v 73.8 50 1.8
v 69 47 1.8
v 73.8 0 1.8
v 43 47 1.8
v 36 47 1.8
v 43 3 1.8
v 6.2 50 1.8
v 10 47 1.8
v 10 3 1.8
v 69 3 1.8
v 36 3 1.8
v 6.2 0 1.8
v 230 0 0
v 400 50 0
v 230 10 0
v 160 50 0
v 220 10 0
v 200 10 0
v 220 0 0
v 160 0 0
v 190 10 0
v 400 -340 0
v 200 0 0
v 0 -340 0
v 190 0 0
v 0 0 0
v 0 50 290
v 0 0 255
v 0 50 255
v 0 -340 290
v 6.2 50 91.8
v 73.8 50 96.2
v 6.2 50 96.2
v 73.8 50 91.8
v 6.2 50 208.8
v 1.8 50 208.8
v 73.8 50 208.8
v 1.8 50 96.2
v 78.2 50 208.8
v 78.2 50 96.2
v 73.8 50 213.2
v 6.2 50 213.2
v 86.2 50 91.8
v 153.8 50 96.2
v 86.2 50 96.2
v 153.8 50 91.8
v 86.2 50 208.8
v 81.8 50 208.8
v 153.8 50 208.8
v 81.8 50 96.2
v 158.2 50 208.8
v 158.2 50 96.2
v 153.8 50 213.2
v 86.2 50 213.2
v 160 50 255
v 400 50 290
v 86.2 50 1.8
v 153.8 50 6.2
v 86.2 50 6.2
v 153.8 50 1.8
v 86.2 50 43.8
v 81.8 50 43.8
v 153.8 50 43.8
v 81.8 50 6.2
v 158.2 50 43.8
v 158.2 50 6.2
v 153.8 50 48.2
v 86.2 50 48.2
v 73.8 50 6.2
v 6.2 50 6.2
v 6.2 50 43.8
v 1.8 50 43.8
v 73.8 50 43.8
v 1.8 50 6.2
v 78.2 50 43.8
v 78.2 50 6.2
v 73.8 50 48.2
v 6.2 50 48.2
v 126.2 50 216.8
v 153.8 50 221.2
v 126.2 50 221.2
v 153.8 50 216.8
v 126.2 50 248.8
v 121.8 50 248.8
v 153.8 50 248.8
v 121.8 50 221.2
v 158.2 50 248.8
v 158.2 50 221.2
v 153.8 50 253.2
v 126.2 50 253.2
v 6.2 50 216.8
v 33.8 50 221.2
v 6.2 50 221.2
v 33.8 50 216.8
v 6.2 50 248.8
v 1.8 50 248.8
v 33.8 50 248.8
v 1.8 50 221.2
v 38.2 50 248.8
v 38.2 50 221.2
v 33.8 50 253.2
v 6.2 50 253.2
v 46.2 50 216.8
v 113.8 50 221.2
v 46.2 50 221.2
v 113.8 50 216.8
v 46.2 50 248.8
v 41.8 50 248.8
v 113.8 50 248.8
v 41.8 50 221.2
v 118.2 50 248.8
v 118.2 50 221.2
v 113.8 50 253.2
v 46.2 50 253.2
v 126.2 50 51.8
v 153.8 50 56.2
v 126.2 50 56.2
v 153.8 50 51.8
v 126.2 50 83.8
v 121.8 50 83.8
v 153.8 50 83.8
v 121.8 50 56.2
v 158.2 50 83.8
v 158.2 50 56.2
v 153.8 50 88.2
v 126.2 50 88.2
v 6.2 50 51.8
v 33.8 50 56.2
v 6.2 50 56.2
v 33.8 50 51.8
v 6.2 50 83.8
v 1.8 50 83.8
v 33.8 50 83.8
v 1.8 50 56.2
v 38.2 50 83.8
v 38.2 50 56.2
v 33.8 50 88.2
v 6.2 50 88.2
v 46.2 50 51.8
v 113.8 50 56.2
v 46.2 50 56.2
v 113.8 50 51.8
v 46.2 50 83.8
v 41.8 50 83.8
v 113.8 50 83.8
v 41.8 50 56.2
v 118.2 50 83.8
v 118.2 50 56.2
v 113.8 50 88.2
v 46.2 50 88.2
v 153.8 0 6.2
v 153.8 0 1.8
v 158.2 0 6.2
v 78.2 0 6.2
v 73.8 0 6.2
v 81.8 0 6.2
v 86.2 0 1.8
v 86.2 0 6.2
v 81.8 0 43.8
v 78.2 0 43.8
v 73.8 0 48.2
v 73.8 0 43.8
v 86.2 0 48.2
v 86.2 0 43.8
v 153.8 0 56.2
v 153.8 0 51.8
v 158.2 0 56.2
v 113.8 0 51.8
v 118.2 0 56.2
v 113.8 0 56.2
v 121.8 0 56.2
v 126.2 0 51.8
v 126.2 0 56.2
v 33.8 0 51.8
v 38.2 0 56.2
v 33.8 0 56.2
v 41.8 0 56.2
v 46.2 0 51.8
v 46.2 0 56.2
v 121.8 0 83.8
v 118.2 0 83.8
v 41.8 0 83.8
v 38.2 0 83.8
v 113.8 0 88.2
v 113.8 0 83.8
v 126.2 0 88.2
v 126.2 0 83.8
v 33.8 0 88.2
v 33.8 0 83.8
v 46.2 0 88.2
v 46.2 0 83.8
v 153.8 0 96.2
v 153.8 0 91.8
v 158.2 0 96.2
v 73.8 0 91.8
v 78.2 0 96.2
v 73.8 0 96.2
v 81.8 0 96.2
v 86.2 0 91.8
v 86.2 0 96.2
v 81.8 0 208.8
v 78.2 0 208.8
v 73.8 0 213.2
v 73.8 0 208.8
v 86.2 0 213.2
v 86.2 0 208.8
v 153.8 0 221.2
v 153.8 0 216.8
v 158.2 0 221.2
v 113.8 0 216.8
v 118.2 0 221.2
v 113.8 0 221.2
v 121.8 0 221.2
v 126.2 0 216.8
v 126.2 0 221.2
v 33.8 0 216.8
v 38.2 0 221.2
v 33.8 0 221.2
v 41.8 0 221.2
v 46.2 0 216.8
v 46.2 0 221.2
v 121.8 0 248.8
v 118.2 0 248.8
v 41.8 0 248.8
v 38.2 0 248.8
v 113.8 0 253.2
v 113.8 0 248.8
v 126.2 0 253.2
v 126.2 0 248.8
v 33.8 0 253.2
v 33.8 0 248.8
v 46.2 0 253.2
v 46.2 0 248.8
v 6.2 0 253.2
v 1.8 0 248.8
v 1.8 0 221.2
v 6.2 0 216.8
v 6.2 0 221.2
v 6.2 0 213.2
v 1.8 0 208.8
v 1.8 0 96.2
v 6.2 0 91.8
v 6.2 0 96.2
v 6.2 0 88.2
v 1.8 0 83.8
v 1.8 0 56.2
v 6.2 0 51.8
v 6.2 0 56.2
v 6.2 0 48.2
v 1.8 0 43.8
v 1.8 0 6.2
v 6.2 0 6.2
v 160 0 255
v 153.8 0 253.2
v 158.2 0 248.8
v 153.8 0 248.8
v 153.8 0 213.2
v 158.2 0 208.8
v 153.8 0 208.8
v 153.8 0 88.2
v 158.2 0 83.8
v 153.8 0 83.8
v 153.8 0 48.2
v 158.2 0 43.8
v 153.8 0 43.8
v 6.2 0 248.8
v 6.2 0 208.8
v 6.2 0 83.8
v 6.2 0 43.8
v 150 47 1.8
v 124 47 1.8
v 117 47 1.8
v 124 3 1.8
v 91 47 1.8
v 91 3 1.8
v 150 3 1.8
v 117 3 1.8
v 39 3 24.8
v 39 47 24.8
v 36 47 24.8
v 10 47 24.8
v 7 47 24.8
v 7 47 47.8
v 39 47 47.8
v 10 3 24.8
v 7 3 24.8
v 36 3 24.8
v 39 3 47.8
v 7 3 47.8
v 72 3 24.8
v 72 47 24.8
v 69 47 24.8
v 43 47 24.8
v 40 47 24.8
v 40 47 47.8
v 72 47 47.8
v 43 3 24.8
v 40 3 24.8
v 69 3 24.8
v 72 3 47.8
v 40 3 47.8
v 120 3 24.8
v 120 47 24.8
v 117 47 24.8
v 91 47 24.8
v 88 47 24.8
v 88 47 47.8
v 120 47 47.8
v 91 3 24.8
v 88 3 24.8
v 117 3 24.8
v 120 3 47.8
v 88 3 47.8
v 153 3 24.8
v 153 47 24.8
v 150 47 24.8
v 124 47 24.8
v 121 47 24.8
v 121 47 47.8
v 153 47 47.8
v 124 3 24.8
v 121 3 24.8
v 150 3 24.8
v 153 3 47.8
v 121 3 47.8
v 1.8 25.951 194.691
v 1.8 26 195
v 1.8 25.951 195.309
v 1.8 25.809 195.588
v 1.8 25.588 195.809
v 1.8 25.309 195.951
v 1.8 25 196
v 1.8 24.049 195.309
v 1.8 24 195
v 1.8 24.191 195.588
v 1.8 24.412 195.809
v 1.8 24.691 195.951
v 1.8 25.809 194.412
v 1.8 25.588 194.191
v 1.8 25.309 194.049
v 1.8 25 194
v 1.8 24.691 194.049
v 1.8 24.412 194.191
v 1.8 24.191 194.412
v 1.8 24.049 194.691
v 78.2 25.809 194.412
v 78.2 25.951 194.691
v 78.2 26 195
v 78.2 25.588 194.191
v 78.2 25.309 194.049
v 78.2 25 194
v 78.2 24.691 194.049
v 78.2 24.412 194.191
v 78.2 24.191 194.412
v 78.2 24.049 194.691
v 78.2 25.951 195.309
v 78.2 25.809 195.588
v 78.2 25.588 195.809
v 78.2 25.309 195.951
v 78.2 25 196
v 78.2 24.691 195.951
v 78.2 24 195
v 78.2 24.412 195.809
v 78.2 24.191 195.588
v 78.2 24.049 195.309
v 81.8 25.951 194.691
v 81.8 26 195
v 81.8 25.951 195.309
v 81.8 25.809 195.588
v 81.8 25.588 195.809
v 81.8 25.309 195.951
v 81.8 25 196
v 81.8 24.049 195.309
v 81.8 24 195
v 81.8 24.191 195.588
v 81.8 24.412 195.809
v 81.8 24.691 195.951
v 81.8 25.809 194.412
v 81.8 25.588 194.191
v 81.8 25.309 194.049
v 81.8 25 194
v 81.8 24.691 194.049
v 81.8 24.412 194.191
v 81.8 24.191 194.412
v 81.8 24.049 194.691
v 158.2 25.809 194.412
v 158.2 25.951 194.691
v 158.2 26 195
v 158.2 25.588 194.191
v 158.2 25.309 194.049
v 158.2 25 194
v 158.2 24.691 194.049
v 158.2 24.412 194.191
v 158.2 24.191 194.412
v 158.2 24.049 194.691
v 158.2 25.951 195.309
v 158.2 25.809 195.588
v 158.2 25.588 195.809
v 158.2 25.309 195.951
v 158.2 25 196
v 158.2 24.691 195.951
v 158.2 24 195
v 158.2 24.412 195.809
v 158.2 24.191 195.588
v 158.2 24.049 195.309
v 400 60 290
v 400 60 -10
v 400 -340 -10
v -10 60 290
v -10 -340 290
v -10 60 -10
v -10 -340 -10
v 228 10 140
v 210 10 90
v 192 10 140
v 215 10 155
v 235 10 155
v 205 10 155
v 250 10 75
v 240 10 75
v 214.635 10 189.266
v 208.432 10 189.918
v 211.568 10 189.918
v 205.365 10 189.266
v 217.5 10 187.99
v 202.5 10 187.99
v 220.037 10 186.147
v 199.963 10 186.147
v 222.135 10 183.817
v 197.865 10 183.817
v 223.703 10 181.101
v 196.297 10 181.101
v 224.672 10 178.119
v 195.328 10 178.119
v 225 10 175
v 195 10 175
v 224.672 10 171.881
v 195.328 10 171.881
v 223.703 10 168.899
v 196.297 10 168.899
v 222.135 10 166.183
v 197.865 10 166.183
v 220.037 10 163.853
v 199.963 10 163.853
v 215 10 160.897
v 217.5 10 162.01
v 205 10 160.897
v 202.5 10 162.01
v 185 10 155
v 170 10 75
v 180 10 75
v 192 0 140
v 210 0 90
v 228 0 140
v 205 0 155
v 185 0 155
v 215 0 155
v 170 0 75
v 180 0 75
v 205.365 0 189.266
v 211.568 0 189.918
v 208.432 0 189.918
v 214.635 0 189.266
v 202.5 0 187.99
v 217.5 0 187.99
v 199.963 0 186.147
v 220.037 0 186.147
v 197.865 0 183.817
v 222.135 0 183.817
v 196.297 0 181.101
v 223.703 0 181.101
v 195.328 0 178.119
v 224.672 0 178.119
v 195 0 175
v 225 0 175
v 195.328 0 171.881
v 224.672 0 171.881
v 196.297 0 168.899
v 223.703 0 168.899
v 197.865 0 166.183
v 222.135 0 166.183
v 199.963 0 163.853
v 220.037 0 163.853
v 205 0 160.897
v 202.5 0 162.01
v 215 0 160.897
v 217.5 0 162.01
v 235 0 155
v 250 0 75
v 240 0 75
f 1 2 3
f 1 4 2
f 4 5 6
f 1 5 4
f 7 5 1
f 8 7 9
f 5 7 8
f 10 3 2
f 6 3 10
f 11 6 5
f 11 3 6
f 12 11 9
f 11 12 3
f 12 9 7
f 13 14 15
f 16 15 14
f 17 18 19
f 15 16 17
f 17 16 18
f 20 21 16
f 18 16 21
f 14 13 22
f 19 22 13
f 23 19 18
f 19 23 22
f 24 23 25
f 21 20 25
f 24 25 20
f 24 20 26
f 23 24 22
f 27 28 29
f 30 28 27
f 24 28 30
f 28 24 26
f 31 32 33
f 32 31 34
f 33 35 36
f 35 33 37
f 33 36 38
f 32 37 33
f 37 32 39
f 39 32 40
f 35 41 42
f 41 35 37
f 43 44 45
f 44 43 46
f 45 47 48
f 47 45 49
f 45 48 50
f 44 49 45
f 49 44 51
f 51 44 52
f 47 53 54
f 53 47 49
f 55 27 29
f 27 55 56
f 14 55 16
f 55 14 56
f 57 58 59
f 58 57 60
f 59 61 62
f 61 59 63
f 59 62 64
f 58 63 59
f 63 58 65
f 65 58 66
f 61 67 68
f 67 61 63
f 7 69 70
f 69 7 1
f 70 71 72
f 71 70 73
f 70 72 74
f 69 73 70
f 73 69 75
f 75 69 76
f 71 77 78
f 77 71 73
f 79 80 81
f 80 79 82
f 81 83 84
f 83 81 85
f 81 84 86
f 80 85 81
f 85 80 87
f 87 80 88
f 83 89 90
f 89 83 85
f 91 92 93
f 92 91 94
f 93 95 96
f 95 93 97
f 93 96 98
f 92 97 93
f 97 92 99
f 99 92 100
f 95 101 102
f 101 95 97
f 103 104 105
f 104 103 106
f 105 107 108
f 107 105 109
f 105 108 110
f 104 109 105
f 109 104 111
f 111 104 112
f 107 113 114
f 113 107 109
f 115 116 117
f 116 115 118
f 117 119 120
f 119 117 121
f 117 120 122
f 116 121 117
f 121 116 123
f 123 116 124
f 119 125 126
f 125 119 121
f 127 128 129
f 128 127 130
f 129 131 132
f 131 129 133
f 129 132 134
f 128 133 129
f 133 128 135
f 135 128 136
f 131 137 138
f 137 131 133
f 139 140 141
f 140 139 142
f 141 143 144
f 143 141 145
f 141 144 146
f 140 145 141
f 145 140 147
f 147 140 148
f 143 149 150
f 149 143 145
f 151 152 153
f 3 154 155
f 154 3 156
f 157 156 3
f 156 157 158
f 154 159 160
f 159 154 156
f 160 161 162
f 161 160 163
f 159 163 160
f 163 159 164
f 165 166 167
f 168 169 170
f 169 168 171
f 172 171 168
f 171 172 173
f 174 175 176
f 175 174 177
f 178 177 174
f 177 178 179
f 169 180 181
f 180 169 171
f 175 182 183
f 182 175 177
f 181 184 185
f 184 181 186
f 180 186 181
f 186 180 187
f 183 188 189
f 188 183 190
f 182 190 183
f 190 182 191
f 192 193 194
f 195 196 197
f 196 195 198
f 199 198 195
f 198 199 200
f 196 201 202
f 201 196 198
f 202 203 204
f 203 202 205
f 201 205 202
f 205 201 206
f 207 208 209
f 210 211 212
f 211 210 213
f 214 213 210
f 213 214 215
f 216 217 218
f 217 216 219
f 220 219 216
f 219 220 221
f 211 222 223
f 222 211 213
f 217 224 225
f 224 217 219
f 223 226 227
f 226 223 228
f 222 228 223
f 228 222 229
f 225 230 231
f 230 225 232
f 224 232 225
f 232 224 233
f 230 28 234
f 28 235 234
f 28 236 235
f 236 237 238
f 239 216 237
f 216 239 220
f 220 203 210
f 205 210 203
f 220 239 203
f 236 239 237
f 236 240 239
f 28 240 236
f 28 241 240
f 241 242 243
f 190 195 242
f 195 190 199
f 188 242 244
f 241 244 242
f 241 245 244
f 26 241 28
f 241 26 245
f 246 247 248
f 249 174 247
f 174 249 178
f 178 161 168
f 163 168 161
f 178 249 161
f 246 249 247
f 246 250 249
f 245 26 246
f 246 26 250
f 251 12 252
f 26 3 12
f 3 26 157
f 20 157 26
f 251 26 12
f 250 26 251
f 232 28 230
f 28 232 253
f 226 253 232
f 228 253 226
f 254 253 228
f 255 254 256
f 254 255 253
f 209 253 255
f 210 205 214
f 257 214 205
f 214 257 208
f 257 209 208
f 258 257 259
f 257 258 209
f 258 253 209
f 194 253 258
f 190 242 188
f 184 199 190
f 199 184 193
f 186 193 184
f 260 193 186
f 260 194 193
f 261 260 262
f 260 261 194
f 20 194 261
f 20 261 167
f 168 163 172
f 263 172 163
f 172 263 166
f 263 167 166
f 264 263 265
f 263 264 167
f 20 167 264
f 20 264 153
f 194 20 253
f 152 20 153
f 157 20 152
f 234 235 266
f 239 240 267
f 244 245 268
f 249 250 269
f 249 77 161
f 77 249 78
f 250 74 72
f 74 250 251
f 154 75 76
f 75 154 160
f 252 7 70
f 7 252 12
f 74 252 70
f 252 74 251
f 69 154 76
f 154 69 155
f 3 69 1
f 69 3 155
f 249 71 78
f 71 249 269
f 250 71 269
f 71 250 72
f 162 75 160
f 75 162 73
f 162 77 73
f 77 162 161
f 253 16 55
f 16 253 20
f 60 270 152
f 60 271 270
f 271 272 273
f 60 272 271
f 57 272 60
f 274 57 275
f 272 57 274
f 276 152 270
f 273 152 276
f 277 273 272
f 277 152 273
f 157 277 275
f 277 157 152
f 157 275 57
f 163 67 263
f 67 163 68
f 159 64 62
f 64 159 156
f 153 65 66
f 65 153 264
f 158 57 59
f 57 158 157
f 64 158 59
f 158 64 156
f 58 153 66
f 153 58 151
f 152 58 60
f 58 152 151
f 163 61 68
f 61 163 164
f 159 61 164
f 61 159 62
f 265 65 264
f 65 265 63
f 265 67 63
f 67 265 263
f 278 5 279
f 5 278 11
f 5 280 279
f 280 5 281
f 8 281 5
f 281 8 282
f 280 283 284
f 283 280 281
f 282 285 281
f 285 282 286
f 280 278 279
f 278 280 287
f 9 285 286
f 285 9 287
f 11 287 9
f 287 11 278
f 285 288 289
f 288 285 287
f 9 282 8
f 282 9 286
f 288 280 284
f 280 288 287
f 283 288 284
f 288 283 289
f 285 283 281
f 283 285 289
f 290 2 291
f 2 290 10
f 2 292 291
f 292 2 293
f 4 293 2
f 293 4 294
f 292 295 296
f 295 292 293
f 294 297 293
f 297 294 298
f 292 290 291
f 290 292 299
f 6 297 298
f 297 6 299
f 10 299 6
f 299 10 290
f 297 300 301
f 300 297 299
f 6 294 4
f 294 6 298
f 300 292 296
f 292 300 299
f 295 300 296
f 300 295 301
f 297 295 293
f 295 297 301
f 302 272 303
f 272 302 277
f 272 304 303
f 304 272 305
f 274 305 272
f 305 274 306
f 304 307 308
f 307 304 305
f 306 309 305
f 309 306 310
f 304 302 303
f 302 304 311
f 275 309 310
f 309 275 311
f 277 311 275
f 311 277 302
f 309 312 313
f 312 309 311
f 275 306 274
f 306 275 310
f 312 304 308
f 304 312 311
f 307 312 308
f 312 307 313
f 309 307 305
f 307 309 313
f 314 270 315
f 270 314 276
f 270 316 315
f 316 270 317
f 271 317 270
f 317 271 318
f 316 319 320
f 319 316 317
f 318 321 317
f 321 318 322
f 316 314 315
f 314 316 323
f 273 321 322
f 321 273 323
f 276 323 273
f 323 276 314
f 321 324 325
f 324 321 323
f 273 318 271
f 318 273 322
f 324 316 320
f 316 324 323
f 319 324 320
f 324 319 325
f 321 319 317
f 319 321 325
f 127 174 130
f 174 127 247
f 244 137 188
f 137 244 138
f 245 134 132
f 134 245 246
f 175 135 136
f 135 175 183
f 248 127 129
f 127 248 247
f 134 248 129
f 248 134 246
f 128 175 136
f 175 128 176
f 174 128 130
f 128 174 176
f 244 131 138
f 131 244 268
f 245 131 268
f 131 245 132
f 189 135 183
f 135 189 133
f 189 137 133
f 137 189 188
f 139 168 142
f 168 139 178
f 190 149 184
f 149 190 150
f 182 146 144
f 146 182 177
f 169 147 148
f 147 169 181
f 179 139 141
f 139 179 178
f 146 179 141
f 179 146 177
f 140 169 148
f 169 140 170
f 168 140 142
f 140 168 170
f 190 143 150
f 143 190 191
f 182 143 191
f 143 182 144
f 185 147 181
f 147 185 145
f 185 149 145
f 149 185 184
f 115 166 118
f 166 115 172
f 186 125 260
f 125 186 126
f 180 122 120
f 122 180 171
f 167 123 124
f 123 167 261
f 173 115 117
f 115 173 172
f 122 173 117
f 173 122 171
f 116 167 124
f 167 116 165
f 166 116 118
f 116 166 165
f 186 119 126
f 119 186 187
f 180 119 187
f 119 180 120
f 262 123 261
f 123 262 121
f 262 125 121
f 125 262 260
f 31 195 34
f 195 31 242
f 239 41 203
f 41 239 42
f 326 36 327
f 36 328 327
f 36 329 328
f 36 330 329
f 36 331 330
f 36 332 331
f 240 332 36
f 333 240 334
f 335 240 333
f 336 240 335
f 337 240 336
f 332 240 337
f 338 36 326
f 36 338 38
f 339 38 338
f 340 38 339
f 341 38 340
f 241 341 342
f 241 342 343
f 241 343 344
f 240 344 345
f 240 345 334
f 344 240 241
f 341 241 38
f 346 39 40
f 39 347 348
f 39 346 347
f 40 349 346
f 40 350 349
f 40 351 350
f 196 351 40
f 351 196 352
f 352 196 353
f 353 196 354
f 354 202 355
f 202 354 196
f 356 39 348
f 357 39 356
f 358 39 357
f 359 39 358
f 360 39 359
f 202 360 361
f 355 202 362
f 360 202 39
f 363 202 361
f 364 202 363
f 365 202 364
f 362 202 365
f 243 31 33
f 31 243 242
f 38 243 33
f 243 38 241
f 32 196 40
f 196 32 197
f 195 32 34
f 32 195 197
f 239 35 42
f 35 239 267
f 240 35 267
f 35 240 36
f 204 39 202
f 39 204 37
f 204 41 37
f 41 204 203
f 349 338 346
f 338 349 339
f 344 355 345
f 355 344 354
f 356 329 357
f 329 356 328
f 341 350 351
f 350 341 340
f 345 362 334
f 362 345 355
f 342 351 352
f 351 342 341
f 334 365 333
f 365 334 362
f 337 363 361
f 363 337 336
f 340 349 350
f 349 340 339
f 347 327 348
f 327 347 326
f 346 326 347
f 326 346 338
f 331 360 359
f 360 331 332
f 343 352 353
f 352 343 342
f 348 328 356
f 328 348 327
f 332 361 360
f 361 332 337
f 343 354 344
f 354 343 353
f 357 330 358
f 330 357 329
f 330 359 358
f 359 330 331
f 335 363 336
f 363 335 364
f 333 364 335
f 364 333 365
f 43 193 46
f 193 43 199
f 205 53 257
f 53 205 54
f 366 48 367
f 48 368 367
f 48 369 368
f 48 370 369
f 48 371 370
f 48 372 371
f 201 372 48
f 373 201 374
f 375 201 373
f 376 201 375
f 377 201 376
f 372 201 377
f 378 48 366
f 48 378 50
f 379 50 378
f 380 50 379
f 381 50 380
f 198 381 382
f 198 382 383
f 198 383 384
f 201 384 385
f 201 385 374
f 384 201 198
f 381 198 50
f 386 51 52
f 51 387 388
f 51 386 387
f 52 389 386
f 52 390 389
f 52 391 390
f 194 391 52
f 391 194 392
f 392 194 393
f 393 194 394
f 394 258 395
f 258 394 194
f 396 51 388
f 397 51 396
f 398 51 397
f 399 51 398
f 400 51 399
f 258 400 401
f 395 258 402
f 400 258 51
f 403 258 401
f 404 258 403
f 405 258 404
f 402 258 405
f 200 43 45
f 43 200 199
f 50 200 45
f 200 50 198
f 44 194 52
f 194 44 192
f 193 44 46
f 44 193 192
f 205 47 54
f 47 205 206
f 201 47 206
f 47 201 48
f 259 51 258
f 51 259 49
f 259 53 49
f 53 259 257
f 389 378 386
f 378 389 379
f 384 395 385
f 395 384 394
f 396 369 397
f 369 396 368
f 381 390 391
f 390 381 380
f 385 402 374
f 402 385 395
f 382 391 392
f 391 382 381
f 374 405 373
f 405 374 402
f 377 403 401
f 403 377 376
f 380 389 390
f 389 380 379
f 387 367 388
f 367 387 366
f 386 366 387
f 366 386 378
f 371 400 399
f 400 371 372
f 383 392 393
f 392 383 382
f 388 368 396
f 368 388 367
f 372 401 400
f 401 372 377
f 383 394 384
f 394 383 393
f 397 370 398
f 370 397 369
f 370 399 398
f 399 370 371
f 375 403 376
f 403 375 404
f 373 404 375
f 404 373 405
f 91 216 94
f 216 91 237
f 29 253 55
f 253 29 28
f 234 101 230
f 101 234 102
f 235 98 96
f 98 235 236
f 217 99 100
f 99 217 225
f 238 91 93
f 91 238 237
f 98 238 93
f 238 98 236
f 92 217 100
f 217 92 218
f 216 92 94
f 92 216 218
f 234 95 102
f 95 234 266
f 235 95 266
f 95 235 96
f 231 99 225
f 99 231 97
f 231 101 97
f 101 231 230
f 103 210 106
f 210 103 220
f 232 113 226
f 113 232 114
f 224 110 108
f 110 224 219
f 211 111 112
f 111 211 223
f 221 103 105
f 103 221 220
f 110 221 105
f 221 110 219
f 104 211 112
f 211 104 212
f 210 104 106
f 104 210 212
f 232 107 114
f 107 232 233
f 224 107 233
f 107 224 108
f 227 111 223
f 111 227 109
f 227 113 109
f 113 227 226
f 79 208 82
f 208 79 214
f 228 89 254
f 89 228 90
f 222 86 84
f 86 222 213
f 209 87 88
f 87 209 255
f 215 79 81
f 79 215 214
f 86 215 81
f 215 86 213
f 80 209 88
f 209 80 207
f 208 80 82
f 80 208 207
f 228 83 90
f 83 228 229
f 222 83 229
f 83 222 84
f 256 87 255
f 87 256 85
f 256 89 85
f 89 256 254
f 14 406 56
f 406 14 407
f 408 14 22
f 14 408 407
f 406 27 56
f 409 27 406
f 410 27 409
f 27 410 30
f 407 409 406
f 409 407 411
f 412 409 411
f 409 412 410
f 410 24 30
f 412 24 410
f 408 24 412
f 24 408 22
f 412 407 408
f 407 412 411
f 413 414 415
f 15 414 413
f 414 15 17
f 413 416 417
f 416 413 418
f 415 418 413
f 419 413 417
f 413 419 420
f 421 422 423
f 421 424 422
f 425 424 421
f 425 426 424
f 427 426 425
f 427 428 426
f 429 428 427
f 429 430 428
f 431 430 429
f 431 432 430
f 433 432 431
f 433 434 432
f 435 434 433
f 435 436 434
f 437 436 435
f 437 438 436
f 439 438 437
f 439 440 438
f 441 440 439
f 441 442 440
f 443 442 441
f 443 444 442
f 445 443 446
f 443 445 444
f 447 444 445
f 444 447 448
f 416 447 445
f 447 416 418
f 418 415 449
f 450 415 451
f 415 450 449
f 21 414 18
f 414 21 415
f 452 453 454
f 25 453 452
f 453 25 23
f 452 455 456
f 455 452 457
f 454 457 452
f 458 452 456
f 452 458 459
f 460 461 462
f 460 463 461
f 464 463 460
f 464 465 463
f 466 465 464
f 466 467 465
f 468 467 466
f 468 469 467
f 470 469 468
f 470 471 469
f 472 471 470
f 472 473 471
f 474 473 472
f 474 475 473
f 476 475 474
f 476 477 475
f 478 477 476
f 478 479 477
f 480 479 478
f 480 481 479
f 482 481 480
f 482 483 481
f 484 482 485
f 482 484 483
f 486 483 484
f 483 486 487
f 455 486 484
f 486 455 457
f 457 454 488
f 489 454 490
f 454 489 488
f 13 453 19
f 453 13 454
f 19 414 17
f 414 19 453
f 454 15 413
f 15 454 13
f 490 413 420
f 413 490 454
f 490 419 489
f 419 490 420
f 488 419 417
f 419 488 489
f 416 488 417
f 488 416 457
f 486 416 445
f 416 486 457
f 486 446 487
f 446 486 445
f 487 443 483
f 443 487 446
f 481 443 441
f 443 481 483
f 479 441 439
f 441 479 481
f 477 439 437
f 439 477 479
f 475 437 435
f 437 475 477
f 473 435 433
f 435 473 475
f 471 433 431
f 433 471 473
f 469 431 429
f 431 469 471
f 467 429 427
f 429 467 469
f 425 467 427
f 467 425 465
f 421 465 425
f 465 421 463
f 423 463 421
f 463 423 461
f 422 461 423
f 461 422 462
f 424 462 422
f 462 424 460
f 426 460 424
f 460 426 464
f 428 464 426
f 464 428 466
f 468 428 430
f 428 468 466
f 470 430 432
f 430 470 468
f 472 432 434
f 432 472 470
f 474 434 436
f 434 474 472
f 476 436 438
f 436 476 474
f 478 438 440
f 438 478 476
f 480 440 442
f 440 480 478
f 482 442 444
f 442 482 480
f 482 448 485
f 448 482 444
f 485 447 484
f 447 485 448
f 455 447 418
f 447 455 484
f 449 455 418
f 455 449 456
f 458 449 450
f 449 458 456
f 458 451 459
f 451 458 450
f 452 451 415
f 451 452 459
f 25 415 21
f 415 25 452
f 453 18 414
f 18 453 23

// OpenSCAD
/* measurements (in cm): */
MODULE_OUTERWIDTH = 80;
MODULE_DEPTH = 50;
WALL_THICKNESS = 1.8;
CORNER_SIZE = 4.4;
CLOTHESRAIL_RADIUS = 1;
CLOTHESRAIL_SPACE = 20;
/* other settings: */
WALLS = true;
REFERENCE_OBJECTS = true;
ROOM_HEIGHT = 290;

module closetModuleCorner(depth) {
    cube([CORNER_SIZE, depth, CORNER_SIZE]);
}

module closetModule(
    outerHeight,
    outerWidth=MODULE_OUTERWIDTH,
    depth=MODULE_DEPTH
) {
    color("brown") {
    /* bottom wall */
    cube([outerWidth, depth, WALL_THICKNESS]);
    /* top wall */
    translate([0, 0, outerHeight-WALL_THICKNESS])
        cube([outerWidth, depth, WALL_THICKNESS]);
    /* left wall */
    cube([WALL_THICKNESS, depth, outerHeight]);
    /* right wall */
    translate([outerWidth-WALL_THICKNESS, 0, 0])
        cube([WALL_THICKNESS, depth, outerHeight]);
    /* bottom left corner */
    translate([WALL_THICKNESS, 0, WALL_THICKNESS])
        closetModuleCorner(depth);
    /* bottom right corner */
    translate([outerWidth-WALL_THICKNESS-CORNER_SIZE, 0, WALL_THICKNESS])
        closetModuleCorner(depth);
    /* top left corner */
    translate([WALL_THICKNESS, 0, outerHeight-WALL_THICKNESS-CORNER_SIZE])
        closetModuleCorner(depth);
    /* top right corner */
    translate([outerWidth-WALL_THICKNESS-CORNER_SIZE, 0, outerHeight-WALL_THICKNESS-CORNER_SIZE])
        closetModuleCorner(depth);
    }
}

module closetModuleWithClothesRail(
    outerHeight,
    outerWidth=MODULE_OUTERWIDTH,
    depth=MODULE_DEPTH
) {
    closetModule(outerHeight, outerWidth, depth);
    color("gray")
    translate([0, depth/2, outerHeight-CLOTHESRAIL_SPACE])
    rotate([0,90,0])
        cylinder(outerWidth, CLOTHESRAIL_RADIUS, CLOTHESRAIL_RADIUS, $fn=20);
}

module plasticBox() {
    color("gray")
    translate([0, 47, WALL_THICKNESS])
    rotate([90, 0, 0])
    linear_extrude(44)
        polygon([[3,0], [29,0], [32, 23], [0,23]]);
}

module plasticBoxStack() {
    plasticBox();
    translate([0, 0, 23]) plasticBox();
}

module halfHumanShape() {
    polygon([
        /* leg */
        [-20,0], [-10,0], [0,90], /*[-15,90],*/
        /* up to the neck */
        [0,165], [-5,165], [-5,155], [-25,155],
        /* arm */
        [-40,75], [-30,75], [-18,140]
    ]);
}

module human() {
    color("pink")
    translate([40,10,0])
    rotate([90,0,0])
    linear_extrude(10) {
        halfHumanShape();
        mirror([1,0]) halfHumanShape();
        /* head */
        translate([0,175]) circle(d=30);
    }
}

width = MODULE_OUTERWIDTH;
/* first row: boxes */
closetModule(50);
translate([width, 0, 0]) closetModule(50);
if (REFERENCE_OBJECTS) {
    translate([7,0,0]) plasticBoxStack();
    translate([40,0,0]) plasticBoxStack();
    translate([88,0,0]) plasticBoxStack();
    translate([121,0,0]) plasticBoxStack();
};
/* second row: miscellaneous stuff */
translate([0, 0, 50]) union() {
    closetModule(40, width/2);
    translate([width/2, 0, 0]) closetModule(40);
    translate([width*1.5, 0, 0]) closetModule(40, width/2);
}
/* third row: clothes rails */
translate([0,0, 90]) union() {
    closetModuleWithClothesRail(125);
    translate([width, 0, 0])
        closetModuleWithClothesRail(125);
}
/* fourth row: more misc. stuff */
translate([0, 0, 215]) union() {
    closetModule(40, width/2);
    translate([width/2, 0, 0]) closetModule(40);
    translate([width*1.5, 0, 0]) closetModule(40, width/2);
}
/* human for reference (190cm) */
if (REFERENCE_OBJECTS) {
    translate([170,0,0]) human();
};
/* walls */
if (WALLS) {
    color("white") {
    translate([0,50,0])
        cube([400,10,ROOM_HEIGHT]);
    translate([-10,-340,0])
        cube([10,400,ROOM_HEIGHT]);
    translate([-10,-340,-10])
        cube([410,400,10]);
    }
};
